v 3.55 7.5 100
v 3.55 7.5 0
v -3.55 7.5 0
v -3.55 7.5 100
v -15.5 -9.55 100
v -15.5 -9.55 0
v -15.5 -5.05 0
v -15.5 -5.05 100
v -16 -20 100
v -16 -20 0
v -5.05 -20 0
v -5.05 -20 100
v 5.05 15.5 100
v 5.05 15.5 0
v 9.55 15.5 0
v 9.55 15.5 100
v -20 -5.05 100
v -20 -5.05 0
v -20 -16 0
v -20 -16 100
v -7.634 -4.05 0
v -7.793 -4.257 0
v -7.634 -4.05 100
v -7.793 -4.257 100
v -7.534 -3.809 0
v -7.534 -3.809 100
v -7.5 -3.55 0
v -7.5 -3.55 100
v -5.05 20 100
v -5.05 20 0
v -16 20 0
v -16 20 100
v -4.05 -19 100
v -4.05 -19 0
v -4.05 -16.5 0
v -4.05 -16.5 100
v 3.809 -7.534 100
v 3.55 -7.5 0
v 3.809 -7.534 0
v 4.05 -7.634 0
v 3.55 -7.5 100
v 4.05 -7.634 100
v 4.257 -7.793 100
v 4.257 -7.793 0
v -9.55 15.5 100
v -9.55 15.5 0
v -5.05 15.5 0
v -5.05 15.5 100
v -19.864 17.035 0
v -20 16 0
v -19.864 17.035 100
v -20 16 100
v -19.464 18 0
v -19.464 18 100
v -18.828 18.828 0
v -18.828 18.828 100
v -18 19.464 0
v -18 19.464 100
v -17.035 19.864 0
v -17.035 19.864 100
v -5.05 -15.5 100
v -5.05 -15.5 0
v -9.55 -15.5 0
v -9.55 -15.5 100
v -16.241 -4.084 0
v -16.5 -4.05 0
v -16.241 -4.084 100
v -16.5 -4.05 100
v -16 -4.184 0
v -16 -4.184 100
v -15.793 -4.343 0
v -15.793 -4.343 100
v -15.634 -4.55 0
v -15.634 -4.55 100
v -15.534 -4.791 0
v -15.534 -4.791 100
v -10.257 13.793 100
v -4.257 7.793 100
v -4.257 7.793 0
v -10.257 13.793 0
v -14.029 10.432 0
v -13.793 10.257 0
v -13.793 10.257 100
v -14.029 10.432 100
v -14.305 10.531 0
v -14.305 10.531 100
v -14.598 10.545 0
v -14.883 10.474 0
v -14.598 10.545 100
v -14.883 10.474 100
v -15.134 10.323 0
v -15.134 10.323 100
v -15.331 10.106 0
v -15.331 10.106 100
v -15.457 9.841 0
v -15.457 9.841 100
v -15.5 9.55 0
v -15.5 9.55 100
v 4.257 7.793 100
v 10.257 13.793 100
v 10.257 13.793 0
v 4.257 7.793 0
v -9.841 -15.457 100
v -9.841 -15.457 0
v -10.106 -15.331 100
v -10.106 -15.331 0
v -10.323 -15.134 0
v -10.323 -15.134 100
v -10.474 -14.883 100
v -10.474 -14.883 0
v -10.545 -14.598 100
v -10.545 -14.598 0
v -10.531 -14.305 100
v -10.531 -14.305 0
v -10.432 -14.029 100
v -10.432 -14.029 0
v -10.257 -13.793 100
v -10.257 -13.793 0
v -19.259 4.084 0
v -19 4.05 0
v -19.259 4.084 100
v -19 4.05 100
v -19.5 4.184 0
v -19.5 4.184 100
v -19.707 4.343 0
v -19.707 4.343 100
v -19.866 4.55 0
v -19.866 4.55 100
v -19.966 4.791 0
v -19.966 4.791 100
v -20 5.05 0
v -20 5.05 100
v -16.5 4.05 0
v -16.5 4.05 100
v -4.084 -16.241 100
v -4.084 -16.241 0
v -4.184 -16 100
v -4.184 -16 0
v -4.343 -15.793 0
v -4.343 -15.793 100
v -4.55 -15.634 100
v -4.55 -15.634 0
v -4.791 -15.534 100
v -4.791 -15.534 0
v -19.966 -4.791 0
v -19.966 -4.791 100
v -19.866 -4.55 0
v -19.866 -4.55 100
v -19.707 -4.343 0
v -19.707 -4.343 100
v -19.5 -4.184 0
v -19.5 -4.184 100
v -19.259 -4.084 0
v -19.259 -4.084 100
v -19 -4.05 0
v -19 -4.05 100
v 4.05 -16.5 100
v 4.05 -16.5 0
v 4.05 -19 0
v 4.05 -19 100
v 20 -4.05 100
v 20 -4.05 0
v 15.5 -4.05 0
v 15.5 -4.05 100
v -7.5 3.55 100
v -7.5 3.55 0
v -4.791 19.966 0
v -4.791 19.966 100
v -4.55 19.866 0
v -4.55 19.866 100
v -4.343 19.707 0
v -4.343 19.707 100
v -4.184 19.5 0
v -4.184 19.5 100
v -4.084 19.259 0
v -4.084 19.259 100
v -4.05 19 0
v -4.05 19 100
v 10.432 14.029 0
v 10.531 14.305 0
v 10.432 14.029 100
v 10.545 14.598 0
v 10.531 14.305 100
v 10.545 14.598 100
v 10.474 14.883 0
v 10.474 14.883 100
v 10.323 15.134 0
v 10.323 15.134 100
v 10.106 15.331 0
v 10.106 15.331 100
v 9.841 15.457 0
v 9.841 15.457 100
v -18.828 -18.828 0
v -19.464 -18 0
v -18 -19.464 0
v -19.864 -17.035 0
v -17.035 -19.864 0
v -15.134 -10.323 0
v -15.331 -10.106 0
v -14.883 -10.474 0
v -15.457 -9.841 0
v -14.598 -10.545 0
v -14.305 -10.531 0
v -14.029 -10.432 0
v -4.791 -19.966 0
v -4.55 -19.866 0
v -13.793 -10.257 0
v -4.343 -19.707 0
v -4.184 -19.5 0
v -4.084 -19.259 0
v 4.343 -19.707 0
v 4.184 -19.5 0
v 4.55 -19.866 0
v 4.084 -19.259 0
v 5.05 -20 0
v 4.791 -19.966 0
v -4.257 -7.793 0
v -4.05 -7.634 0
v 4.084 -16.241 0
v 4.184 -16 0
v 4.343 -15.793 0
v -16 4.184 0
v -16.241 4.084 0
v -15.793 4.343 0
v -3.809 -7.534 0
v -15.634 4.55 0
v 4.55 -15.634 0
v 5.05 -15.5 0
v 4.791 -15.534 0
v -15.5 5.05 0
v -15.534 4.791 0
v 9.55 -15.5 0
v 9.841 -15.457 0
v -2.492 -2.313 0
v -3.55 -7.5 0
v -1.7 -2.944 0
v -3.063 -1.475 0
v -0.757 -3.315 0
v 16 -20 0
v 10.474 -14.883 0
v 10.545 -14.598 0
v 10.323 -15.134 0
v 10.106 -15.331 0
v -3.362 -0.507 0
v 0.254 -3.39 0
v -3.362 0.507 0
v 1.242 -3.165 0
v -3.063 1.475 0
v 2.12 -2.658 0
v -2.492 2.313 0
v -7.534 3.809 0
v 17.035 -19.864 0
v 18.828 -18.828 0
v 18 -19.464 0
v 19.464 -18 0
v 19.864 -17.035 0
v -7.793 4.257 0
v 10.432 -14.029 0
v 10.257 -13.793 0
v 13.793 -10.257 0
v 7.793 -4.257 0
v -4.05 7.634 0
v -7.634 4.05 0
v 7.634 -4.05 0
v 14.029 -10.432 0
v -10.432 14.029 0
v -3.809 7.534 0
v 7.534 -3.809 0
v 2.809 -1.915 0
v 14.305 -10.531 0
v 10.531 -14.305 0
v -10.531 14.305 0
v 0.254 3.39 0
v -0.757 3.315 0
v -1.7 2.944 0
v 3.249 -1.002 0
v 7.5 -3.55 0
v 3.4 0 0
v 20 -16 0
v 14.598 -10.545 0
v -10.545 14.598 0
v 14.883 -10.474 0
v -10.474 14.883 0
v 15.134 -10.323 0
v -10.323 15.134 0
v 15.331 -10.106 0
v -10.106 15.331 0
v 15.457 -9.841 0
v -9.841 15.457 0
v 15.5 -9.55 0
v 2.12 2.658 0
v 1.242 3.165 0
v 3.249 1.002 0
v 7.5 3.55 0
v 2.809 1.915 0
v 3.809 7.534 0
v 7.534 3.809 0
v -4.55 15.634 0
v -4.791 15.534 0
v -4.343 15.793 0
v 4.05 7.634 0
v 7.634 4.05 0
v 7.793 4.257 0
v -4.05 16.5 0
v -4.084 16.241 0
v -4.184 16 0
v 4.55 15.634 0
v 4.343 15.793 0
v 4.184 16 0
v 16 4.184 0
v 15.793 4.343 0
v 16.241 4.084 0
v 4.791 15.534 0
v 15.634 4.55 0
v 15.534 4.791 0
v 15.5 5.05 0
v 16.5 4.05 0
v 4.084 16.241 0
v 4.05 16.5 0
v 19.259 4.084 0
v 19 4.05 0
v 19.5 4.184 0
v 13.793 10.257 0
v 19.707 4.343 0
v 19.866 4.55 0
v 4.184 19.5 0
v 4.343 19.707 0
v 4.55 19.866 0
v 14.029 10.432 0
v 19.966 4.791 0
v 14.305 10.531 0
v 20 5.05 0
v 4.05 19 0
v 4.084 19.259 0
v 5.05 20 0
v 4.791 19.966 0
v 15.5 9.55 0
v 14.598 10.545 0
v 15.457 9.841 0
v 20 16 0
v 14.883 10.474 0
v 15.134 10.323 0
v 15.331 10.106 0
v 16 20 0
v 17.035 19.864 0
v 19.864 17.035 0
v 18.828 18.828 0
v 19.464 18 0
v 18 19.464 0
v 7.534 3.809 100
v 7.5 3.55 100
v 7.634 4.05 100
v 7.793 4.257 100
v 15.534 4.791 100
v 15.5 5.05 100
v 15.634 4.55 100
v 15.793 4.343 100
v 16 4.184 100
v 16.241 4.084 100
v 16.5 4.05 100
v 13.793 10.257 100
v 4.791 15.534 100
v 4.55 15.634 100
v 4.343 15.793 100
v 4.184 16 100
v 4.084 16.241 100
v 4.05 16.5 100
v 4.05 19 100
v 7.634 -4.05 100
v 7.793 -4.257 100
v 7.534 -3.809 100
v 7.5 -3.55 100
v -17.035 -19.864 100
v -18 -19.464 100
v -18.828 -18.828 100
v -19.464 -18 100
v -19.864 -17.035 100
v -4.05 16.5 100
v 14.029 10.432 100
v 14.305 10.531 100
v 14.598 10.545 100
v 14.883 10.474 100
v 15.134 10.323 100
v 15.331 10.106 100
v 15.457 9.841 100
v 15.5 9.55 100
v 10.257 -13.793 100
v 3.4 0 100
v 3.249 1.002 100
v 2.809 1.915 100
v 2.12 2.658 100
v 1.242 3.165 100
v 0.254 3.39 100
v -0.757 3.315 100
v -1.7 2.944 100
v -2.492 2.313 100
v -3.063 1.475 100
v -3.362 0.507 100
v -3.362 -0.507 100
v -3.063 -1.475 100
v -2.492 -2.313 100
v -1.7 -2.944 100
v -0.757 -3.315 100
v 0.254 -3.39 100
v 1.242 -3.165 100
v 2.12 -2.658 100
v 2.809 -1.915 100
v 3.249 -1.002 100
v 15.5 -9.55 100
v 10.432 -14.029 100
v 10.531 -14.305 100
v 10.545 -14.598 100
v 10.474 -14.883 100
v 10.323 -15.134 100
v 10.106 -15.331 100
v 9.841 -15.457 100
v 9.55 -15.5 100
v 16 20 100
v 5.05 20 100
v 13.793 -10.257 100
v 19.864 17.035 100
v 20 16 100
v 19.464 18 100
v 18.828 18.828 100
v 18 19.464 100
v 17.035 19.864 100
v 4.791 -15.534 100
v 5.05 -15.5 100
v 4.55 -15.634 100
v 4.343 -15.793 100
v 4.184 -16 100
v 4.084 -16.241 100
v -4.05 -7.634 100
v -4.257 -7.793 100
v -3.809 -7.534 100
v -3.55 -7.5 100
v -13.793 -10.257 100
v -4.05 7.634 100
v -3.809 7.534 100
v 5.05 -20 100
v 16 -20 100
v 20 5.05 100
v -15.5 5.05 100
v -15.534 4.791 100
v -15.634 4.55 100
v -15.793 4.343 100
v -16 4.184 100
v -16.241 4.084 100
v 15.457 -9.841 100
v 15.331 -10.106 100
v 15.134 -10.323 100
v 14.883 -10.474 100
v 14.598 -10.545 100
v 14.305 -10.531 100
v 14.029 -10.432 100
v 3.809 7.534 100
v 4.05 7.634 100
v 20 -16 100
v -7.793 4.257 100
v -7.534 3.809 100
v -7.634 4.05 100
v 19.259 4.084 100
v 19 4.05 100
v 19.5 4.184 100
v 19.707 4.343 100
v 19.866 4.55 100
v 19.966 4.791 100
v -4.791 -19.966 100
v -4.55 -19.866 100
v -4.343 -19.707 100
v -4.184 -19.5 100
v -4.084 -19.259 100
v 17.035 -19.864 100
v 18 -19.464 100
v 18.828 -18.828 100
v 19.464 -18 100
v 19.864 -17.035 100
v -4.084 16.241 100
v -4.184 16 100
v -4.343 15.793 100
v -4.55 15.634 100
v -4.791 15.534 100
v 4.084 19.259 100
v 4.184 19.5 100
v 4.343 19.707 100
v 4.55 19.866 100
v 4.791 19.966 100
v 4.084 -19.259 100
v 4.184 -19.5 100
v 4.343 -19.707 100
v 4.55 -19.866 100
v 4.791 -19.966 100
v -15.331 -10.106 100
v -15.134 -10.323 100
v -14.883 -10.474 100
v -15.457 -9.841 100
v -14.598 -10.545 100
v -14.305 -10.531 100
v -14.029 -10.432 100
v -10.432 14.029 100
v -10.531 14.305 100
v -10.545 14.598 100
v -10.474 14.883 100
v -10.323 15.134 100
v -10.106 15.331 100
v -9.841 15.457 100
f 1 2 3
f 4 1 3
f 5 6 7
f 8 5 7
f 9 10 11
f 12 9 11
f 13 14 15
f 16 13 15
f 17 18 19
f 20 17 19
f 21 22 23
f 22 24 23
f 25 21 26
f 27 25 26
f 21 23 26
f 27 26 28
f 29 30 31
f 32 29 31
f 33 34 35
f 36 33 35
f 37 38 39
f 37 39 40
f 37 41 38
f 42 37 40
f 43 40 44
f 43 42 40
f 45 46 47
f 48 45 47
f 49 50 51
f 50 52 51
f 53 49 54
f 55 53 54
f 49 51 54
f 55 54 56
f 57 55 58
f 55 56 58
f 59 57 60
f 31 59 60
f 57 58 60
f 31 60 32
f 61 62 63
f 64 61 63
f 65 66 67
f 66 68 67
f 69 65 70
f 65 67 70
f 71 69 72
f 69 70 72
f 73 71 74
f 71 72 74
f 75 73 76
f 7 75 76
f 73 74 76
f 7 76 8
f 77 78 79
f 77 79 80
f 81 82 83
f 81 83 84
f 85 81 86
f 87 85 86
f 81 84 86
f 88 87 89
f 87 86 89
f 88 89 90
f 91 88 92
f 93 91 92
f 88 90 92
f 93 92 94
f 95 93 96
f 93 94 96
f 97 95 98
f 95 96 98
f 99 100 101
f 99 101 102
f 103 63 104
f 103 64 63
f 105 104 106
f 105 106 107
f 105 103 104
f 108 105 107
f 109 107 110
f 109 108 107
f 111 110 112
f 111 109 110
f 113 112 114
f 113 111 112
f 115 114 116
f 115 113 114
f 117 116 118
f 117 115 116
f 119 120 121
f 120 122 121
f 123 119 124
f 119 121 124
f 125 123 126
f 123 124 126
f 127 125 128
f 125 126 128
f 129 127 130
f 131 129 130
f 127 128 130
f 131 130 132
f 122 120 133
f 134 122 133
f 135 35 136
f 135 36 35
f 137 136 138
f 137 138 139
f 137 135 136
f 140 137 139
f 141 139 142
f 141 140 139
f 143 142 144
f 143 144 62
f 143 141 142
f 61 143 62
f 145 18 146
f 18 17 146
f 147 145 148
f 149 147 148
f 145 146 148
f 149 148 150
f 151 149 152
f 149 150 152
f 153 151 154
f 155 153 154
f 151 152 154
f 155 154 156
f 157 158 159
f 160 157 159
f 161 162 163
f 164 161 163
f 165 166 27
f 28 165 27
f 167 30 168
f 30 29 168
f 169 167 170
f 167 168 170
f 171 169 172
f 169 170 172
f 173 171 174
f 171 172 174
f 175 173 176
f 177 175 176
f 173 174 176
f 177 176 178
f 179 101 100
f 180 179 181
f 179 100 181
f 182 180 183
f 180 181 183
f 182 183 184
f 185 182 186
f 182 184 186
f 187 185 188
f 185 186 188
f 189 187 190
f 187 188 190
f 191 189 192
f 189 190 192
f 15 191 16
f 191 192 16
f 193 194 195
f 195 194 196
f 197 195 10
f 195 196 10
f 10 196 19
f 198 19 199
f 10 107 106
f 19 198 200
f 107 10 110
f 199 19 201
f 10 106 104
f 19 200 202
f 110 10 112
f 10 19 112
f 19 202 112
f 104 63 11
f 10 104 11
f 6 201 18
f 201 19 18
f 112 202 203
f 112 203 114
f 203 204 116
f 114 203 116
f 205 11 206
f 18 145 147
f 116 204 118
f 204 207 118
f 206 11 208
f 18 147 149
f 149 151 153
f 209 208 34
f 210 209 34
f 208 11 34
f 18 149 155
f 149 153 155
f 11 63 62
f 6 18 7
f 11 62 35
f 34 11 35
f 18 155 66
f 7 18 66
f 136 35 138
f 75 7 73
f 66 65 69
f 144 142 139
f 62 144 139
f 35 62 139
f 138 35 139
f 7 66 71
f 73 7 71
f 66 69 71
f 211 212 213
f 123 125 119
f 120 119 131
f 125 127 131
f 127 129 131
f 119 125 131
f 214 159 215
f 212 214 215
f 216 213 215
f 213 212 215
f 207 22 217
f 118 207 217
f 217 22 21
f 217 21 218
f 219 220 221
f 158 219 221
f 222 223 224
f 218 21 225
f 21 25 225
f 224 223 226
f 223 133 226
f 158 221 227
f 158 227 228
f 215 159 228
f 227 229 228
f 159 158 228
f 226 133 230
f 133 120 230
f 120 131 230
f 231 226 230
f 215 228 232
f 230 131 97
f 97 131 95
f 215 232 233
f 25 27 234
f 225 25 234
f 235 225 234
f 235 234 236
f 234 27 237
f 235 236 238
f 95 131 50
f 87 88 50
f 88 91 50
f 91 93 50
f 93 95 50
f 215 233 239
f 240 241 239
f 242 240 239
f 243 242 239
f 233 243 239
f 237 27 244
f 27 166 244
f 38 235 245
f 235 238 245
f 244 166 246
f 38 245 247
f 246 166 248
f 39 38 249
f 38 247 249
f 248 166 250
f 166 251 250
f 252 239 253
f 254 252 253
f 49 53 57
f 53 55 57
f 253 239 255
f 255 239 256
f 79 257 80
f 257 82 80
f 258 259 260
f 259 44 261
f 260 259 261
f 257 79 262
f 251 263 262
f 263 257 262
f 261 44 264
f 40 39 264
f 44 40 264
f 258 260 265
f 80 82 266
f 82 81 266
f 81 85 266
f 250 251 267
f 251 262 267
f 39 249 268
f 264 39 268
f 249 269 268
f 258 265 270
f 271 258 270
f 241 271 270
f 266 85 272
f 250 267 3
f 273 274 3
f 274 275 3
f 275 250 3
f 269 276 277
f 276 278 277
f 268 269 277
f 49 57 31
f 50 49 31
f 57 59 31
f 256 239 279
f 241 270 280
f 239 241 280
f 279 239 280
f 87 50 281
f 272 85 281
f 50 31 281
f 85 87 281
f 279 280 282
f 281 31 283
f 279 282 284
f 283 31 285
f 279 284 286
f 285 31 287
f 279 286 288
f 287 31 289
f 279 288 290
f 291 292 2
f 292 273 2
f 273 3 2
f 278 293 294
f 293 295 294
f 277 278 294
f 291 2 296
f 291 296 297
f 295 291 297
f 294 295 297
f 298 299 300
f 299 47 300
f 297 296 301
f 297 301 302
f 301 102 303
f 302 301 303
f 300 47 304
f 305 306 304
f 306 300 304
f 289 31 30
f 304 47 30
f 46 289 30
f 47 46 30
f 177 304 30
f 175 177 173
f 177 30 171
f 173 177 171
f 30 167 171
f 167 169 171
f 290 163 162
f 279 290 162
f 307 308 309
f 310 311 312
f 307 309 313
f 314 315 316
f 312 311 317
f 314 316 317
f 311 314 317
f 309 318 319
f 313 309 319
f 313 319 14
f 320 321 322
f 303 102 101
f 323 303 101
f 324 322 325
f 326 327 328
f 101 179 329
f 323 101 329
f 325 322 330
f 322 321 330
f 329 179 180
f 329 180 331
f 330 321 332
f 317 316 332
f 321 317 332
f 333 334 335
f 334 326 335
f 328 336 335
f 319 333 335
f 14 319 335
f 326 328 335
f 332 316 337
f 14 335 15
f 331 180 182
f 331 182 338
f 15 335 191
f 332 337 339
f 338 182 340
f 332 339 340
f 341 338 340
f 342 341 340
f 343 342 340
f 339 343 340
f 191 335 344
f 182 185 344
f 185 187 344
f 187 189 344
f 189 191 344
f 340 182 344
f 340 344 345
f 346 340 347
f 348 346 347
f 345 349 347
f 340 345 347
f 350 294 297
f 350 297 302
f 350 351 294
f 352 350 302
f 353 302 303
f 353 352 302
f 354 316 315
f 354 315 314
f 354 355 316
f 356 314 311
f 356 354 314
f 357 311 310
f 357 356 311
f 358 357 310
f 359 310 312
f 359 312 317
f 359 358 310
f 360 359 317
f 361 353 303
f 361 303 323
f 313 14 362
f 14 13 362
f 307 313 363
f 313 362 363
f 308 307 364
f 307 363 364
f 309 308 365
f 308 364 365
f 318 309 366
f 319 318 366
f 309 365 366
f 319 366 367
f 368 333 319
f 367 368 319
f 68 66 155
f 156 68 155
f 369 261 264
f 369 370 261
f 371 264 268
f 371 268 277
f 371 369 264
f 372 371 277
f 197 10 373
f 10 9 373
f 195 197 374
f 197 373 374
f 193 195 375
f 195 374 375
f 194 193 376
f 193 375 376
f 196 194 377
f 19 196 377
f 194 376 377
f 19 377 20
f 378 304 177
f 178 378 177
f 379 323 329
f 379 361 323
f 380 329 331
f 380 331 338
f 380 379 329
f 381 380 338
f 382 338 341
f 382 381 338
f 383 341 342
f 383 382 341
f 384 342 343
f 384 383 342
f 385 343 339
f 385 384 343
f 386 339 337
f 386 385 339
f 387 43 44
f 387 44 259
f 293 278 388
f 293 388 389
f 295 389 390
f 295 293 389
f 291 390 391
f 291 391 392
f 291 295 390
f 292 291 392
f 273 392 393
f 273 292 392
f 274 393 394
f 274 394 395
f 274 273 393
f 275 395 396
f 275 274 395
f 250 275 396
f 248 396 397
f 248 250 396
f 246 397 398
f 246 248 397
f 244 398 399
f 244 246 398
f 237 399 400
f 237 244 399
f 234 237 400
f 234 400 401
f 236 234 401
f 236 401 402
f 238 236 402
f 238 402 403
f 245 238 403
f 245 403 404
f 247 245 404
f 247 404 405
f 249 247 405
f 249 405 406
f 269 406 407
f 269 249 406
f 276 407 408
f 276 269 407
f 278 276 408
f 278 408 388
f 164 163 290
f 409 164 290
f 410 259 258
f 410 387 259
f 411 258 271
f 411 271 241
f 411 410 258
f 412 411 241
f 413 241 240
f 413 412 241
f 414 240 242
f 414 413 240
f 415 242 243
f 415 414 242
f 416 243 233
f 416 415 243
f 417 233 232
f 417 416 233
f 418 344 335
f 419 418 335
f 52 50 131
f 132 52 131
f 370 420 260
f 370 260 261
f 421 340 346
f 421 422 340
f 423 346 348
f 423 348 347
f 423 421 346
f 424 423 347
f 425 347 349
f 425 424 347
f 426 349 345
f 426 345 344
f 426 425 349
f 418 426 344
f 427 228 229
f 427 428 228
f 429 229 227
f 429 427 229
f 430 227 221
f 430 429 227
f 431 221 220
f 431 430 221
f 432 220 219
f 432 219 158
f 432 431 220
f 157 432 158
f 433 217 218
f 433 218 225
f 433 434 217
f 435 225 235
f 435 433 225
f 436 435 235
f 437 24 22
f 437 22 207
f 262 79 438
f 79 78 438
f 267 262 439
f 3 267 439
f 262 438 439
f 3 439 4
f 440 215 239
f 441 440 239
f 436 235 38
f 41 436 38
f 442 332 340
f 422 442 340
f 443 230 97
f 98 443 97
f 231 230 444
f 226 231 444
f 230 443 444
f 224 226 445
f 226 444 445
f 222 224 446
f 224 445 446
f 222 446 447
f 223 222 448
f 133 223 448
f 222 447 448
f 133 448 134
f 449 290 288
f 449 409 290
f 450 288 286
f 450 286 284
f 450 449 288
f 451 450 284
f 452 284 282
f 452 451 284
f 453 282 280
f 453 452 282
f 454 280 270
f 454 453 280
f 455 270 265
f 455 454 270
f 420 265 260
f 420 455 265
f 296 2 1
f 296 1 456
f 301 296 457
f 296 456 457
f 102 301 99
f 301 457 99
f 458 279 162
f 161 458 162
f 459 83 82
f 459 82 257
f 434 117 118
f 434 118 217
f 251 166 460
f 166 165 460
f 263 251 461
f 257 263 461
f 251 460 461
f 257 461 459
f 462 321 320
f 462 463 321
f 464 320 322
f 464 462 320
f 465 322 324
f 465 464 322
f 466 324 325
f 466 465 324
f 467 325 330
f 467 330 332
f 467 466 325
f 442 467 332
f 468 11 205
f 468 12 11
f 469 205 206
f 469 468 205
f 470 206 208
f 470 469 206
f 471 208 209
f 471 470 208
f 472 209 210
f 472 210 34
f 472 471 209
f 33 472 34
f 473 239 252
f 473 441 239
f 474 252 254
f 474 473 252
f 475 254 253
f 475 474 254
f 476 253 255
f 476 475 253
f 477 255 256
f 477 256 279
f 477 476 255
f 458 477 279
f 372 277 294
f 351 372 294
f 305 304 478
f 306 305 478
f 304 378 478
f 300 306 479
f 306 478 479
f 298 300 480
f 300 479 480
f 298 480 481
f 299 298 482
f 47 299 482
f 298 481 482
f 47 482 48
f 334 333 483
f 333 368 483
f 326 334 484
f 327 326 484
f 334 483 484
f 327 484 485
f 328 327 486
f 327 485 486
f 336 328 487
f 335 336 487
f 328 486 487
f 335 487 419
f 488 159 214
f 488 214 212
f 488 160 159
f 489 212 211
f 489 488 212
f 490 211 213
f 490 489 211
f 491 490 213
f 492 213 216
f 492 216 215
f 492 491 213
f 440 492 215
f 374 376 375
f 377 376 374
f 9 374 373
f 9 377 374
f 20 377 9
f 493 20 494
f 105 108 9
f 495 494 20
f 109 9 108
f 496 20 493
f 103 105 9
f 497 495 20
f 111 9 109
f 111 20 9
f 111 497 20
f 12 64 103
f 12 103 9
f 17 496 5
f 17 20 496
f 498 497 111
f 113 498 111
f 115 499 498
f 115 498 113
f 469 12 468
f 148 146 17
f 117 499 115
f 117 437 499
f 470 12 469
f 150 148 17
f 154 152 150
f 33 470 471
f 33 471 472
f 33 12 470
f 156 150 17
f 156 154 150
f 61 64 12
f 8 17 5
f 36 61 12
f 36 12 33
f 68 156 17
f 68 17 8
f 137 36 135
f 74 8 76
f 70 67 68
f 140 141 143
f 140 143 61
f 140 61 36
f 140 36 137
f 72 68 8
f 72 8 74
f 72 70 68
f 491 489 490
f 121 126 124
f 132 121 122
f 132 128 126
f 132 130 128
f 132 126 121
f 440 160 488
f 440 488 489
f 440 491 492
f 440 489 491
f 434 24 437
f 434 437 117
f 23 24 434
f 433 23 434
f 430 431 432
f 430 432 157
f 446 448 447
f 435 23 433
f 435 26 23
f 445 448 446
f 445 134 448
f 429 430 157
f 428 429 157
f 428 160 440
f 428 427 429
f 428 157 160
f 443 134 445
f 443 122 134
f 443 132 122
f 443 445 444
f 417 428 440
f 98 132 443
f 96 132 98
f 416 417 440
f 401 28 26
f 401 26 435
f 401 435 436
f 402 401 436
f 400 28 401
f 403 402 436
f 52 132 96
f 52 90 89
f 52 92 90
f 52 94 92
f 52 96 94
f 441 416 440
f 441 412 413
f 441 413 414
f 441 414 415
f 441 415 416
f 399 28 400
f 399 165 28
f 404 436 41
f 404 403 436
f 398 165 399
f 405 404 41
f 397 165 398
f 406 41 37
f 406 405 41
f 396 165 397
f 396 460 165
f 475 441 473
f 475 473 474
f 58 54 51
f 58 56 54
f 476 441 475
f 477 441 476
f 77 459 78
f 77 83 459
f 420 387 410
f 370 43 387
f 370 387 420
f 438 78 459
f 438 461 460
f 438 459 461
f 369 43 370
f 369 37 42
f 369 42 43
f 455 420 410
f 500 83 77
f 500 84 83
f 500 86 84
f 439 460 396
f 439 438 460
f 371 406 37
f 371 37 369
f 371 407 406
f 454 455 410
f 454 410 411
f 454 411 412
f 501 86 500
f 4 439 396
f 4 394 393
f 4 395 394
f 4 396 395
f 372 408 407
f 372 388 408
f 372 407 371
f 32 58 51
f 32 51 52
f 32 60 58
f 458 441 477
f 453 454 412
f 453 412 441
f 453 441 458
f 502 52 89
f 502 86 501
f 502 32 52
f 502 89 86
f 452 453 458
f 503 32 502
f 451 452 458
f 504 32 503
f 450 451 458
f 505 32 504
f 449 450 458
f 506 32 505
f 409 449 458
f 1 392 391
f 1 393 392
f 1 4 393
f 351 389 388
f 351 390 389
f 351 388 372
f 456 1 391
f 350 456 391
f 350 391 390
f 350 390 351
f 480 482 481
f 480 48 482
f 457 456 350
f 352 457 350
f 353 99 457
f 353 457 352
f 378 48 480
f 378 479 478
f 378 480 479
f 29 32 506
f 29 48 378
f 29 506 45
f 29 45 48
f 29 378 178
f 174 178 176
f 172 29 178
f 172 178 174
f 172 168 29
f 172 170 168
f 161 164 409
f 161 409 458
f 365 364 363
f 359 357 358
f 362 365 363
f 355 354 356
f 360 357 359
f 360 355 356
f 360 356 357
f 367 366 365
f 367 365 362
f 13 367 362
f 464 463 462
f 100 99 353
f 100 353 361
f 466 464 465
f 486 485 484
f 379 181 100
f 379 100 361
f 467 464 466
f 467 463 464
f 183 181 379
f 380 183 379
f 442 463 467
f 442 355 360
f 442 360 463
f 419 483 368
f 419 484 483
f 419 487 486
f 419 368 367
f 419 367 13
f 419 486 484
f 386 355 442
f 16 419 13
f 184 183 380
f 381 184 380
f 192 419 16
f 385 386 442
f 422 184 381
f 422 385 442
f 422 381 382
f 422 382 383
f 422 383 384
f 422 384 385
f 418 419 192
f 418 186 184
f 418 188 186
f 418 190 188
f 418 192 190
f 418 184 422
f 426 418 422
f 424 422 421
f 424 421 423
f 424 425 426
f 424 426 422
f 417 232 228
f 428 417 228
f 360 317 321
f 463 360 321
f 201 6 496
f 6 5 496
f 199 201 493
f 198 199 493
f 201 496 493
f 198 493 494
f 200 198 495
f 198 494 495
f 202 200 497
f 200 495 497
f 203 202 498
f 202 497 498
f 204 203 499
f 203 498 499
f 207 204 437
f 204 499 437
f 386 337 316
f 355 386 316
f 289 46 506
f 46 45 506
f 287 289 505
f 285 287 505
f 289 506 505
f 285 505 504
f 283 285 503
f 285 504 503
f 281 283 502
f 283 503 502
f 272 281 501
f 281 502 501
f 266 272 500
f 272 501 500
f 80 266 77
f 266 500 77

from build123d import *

# Parameters (mm, degrees)
SKIZZE1_R                       = 3.4
AUFSATZ_LINEAR_AUSTRAGEN1_DEPTH = 100
VERRUNDUNG1_R                   = 4
VERRUNDUNG2_R                   = 1


with BuildPart() as part:
    # Skizze1 → Aufsatz-Linear austragen1 (new body)
    with BuildSketch(Plane.XY):
        Polygon((-20, -20), (-4.05, -20), (-4.05, -15.5), (-11.964466094, -15.5), (-3.964466094, -7.5), (3.964466094, -7.5), (11.964466094, -15.5), (4.05, -15.5), (4.05, -20), (20, -20), (20, -4.05), (15.5, -4.05), (15.5, -11.964466094), (7.5, -3.964466094), (7.5, 3.964466094), (15.5, 11.964466094), (15.5, 4.05), (20, 4.05), (20, 20), (4.05, 20), (4.05, 15.5), (11.964466094, 15.5), (3.964466094, 7.5), (-3.964466094, 7.5), (-11.964466094, 15.5), (-4.05, 15.5), (-4.05, 20), (-20, 20), (-20, 4.05), (-15.5, 4.05), (-15.5, 11.964466094), (-7.5, 3.964466094), (-7.5, -3.964466094), (-15.5, -11.964466094), (-15.5, -4.05), (-20, -4.05), align=None)
        Circle(SKIZZE1_R, mode=Mode.SUBTRACT)
    extrude(amount=AUFSATZ_LINEAR_AUSTRAGEN1_DEPTH)

    # Verrundung1
    verrundung1_edges = [part.edges().sort_by_distance(p)[0] for p in [
        (20, -20, 50),
        (-20, -20, 50),
        (-20, 20, 50),
        (20, 20, 50),
    ]]
    fillet(verrundung1_edges, radius=VERRUNDUNG1_R)

    # Verrundung2
    verrundung2_edges = [part.edges().sort_by_distance(p)[0] for p in [
        (20, 4.05, 50),
        (15.5, 4.05, 50),
        (15.5, 11.964466094, 50),
        (7.5, 3.964466094, 50),
        (7.5, -3.964466094, 50),
        (15.5, -11.964466094, 50),
        (4.05, -20, 50),
        (4.05, -15.5, 50),
        (11.964466094, -15.5, 50),
        (3.964466094, -7.5, 50),
        (-3.964466094, -7.5, 50),
        (-11.964466094, -15.5, 50),
        (-4.05, -15.5, 50),
        (-4.05, -20, 50),
        (-20, -4.05, 50),
        (-15.5, -4.05, 50),
        (-15.5, -11.964466094, 50),
        (-7.5, -3.964466094, 50),
        (-7.5, 3.964466094, 50),
        (-15.5, 11.964466094, 50),
        (-15.5, 4.05, 50),
        (-20, 4.05, 50),
        (-4.05, 20, 50),
        (-4.05, 15.5, 50),
        (-11.964466094, 15.5, 50),
        (-3.964466094, 7.5, 50),
        (3.964466094, 7.5, 50),
        (11.964466094, 15.5, 50),
        (4.05, 15.5, 50),
        (4.05, 20, 50),
    ]]
    fillet(verrundung2_edges, radius=VERRUNDUNG2_R)


solid = part.part
